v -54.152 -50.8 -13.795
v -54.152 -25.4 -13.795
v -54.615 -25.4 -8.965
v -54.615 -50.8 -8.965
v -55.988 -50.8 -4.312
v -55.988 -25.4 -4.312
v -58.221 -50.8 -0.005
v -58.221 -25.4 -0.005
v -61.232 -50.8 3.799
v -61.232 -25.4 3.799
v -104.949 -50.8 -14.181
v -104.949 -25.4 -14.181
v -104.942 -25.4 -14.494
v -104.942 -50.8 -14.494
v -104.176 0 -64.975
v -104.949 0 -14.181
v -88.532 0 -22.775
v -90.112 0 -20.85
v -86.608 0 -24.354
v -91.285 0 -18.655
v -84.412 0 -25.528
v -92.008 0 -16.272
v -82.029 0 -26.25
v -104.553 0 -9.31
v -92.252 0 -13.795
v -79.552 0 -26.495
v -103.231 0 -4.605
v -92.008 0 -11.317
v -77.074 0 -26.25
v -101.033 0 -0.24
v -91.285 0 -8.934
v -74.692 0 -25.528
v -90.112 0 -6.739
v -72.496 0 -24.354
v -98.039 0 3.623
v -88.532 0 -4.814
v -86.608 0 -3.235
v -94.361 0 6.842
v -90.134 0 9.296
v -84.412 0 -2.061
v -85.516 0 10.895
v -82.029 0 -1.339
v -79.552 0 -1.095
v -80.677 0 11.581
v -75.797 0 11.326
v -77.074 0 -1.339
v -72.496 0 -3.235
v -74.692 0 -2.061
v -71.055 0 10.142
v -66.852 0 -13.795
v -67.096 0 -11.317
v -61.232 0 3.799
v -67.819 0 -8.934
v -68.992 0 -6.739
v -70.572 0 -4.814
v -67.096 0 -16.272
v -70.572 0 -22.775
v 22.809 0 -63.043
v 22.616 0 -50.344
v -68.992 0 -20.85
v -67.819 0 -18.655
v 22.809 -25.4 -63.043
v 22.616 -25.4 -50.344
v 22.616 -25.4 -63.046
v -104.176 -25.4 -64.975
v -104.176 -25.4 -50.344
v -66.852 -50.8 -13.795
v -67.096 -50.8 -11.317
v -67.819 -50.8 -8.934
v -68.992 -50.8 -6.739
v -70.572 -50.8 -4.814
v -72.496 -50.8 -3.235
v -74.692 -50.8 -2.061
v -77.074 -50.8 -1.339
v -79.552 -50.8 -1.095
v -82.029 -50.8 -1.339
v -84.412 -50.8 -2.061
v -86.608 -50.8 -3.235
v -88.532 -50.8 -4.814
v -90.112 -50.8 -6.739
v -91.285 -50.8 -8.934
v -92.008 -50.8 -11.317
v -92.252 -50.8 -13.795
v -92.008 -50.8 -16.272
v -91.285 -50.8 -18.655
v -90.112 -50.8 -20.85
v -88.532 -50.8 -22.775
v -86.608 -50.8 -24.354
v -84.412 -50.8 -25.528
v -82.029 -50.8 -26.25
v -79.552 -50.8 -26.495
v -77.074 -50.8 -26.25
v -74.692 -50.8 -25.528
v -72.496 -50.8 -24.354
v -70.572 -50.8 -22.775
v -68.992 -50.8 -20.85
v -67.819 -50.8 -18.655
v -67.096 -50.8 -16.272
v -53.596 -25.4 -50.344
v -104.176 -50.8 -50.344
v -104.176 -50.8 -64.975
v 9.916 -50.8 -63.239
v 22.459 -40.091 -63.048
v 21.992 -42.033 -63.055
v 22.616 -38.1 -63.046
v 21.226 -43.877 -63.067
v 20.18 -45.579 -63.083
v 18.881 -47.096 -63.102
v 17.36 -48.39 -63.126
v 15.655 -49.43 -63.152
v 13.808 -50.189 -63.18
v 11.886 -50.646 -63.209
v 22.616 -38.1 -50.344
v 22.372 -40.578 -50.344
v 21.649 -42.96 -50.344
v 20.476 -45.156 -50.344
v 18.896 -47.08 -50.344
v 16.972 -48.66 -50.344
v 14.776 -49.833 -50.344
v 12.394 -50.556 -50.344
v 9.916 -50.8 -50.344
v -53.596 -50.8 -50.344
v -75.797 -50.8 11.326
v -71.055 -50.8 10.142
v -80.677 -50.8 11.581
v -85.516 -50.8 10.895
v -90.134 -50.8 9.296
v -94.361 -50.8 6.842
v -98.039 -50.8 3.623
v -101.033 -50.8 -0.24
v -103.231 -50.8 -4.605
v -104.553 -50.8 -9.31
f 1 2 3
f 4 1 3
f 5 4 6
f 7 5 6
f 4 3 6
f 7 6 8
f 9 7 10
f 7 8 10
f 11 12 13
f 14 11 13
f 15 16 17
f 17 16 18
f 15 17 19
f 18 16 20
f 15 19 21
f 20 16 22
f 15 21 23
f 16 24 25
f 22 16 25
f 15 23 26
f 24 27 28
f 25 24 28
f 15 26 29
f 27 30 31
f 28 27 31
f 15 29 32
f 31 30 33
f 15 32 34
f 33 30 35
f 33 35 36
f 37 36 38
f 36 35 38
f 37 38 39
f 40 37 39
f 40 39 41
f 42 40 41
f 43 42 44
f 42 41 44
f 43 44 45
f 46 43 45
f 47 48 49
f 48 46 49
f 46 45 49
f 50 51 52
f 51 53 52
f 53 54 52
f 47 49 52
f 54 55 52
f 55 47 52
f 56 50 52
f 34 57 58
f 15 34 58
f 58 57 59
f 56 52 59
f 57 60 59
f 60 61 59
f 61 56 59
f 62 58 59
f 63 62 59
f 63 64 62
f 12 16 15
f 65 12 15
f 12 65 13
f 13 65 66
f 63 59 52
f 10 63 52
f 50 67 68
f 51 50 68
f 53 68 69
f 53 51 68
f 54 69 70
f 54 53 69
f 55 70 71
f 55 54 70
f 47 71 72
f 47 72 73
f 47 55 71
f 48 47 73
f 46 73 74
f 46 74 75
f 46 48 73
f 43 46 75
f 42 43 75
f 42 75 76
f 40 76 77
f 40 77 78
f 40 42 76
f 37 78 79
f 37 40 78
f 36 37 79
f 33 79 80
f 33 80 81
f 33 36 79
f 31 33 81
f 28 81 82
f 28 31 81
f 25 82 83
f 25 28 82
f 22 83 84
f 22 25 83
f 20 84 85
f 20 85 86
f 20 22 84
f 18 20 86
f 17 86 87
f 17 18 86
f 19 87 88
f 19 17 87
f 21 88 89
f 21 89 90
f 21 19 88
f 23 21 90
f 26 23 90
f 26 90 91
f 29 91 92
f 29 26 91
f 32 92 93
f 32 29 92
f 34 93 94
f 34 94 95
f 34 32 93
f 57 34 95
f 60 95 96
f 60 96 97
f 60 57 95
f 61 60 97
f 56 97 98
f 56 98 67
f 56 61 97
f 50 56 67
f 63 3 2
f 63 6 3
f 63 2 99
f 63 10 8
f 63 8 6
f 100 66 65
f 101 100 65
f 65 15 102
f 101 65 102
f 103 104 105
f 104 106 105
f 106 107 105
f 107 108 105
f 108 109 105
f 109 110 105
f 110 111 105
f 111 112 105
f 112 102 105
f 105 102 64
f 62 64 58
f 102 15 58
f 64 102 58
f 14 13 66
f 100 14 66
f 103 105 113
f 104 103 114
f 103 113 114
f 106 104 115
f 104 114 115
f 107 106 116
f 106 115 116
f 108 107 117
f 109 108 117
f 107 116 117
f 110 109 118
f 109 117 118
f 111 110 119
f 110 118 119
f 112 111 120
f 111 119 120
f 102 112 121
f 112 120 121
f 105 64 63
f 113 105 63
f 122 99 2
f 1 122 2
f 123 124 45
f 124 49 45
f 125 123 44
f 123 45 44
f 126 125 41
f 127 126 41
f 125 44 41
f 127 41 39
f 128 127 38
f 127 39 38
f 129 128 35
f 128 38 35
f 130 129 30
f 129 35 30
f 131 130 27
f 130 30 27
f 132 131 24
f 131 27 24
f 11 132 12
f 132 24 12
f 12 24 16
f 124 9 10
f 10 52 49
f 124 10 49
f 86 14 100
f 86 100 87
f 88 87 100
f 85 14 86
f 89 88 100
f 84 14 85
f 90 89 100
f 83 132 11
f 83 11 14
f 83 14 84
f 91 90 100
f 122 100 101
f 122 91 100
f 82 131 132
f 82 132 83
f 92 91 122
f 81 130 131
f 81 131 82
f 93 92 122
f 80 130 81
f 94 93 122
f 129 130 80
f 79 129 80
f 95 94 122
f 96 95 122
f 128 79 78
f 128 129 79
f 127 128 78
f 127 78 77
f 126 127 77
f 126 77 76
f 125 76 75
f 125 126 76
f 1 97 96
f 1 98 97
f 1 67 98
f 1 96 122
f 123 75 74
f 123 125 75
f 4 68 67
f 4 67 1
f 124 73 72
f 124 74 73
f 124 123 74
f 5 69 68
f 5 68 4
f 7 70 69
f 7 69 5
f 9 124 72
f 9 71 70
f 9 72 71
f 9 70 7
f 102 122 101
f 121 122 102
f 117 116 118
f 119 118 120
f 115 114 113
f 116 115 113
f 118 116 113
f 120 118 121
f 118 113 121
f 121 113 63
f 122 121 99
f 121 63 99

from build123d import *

# Parameters (mm, degrees)
F0_R     = 12.7
F1_DEPTH = 25.4
F2_R     = 12.7
F3_DEPTH = 25.4
F4_R     = 12.7


with BuildPart() as f1:
    # F0 (on Front) → F1 (new body)
    with BuildSketch(Plane.XZ):
        with BuildLine():
            Line((22.6161210575, -50.3441899378), (-61.2315756106, 3.798879284))
            Line((-61.2315756106, 3.798879284), (-71.0548742693, 10.14208918))
            ThreePointArc((-71.0548742693, 10.14208918), (-94.3608422008, 6.8416897346), (-104.9488988238, -14.1810083481))
            Line((-104.9488988238, -14.1810083481), (-104.1759357505, -64.9751273787))
            Line((-104.1759357505, -64.9751273787), (22.8093618259, -63.0427196954))
            Line((22.8093618259, -63.0427196954), (22.6161210575, -50.3441899378))
        make_face()
        with Locations((-79.5518393085, -13.7945268115)):
            Circle(F0_R, mode=Mode.SUBTRACT)
    extrude(amount=F1_DEPTH)

    # F2 (on face) → F3 (join)
    with BuildSketch(Plane.XZ.offset(25.4)):
        with BuildLine():
            Line((-61.2315756106, 3.798879284), (-71.0548742693, 10.14208918))
            ThreePointArc((-71.0548742693, 10.14208918), (-94.3608422008, 6.8416897346), (-104.9488988238, -14.1810083481))
            Line((-104.9488988238, -14.1810083481), (-104.9422175693, -14.4935917412))
            Line((-104.9422175693, -14.4935917412), (-104.1759357505, -50.3441899378))
            Line((-104.1759357505, -50.3441899378), (-104.1759357505, -64.9751273787))
            Line((-104.1759357505, -64.9751273787), (22.6161210575, -63.0456603504))
            Line((22.6161210575, -63.0456603504), (22.6161210575, -50.3441899378))
            Line((22.6161210575, -50.3441899378), (-53.5956422432, -50.3441899378))
            Line((-53.5956422432, -50.3441899378), (-54.1518393085, -13.7945268115))
            ThreePointArc((-54.1518393085, -13.7945268115), (-55.9881522251, -4.3122986431), (-61.2315756106, 3.798879284))
        make_face()
        with Locations((-79.5518393085, -13.7945268115)):
            Circle(F2_R, mode=Mode.SUBTRACT)
    extrude(amount=F3_DEPTH)

    # F4
    f4_edges = [f1.edges().sort_by_distance(p)[0] for p in [
        (22.616121, -50.8, -56.694925),
    ]]
    fillet(f4_edges, radius=F4_R)


solid = f1.part
